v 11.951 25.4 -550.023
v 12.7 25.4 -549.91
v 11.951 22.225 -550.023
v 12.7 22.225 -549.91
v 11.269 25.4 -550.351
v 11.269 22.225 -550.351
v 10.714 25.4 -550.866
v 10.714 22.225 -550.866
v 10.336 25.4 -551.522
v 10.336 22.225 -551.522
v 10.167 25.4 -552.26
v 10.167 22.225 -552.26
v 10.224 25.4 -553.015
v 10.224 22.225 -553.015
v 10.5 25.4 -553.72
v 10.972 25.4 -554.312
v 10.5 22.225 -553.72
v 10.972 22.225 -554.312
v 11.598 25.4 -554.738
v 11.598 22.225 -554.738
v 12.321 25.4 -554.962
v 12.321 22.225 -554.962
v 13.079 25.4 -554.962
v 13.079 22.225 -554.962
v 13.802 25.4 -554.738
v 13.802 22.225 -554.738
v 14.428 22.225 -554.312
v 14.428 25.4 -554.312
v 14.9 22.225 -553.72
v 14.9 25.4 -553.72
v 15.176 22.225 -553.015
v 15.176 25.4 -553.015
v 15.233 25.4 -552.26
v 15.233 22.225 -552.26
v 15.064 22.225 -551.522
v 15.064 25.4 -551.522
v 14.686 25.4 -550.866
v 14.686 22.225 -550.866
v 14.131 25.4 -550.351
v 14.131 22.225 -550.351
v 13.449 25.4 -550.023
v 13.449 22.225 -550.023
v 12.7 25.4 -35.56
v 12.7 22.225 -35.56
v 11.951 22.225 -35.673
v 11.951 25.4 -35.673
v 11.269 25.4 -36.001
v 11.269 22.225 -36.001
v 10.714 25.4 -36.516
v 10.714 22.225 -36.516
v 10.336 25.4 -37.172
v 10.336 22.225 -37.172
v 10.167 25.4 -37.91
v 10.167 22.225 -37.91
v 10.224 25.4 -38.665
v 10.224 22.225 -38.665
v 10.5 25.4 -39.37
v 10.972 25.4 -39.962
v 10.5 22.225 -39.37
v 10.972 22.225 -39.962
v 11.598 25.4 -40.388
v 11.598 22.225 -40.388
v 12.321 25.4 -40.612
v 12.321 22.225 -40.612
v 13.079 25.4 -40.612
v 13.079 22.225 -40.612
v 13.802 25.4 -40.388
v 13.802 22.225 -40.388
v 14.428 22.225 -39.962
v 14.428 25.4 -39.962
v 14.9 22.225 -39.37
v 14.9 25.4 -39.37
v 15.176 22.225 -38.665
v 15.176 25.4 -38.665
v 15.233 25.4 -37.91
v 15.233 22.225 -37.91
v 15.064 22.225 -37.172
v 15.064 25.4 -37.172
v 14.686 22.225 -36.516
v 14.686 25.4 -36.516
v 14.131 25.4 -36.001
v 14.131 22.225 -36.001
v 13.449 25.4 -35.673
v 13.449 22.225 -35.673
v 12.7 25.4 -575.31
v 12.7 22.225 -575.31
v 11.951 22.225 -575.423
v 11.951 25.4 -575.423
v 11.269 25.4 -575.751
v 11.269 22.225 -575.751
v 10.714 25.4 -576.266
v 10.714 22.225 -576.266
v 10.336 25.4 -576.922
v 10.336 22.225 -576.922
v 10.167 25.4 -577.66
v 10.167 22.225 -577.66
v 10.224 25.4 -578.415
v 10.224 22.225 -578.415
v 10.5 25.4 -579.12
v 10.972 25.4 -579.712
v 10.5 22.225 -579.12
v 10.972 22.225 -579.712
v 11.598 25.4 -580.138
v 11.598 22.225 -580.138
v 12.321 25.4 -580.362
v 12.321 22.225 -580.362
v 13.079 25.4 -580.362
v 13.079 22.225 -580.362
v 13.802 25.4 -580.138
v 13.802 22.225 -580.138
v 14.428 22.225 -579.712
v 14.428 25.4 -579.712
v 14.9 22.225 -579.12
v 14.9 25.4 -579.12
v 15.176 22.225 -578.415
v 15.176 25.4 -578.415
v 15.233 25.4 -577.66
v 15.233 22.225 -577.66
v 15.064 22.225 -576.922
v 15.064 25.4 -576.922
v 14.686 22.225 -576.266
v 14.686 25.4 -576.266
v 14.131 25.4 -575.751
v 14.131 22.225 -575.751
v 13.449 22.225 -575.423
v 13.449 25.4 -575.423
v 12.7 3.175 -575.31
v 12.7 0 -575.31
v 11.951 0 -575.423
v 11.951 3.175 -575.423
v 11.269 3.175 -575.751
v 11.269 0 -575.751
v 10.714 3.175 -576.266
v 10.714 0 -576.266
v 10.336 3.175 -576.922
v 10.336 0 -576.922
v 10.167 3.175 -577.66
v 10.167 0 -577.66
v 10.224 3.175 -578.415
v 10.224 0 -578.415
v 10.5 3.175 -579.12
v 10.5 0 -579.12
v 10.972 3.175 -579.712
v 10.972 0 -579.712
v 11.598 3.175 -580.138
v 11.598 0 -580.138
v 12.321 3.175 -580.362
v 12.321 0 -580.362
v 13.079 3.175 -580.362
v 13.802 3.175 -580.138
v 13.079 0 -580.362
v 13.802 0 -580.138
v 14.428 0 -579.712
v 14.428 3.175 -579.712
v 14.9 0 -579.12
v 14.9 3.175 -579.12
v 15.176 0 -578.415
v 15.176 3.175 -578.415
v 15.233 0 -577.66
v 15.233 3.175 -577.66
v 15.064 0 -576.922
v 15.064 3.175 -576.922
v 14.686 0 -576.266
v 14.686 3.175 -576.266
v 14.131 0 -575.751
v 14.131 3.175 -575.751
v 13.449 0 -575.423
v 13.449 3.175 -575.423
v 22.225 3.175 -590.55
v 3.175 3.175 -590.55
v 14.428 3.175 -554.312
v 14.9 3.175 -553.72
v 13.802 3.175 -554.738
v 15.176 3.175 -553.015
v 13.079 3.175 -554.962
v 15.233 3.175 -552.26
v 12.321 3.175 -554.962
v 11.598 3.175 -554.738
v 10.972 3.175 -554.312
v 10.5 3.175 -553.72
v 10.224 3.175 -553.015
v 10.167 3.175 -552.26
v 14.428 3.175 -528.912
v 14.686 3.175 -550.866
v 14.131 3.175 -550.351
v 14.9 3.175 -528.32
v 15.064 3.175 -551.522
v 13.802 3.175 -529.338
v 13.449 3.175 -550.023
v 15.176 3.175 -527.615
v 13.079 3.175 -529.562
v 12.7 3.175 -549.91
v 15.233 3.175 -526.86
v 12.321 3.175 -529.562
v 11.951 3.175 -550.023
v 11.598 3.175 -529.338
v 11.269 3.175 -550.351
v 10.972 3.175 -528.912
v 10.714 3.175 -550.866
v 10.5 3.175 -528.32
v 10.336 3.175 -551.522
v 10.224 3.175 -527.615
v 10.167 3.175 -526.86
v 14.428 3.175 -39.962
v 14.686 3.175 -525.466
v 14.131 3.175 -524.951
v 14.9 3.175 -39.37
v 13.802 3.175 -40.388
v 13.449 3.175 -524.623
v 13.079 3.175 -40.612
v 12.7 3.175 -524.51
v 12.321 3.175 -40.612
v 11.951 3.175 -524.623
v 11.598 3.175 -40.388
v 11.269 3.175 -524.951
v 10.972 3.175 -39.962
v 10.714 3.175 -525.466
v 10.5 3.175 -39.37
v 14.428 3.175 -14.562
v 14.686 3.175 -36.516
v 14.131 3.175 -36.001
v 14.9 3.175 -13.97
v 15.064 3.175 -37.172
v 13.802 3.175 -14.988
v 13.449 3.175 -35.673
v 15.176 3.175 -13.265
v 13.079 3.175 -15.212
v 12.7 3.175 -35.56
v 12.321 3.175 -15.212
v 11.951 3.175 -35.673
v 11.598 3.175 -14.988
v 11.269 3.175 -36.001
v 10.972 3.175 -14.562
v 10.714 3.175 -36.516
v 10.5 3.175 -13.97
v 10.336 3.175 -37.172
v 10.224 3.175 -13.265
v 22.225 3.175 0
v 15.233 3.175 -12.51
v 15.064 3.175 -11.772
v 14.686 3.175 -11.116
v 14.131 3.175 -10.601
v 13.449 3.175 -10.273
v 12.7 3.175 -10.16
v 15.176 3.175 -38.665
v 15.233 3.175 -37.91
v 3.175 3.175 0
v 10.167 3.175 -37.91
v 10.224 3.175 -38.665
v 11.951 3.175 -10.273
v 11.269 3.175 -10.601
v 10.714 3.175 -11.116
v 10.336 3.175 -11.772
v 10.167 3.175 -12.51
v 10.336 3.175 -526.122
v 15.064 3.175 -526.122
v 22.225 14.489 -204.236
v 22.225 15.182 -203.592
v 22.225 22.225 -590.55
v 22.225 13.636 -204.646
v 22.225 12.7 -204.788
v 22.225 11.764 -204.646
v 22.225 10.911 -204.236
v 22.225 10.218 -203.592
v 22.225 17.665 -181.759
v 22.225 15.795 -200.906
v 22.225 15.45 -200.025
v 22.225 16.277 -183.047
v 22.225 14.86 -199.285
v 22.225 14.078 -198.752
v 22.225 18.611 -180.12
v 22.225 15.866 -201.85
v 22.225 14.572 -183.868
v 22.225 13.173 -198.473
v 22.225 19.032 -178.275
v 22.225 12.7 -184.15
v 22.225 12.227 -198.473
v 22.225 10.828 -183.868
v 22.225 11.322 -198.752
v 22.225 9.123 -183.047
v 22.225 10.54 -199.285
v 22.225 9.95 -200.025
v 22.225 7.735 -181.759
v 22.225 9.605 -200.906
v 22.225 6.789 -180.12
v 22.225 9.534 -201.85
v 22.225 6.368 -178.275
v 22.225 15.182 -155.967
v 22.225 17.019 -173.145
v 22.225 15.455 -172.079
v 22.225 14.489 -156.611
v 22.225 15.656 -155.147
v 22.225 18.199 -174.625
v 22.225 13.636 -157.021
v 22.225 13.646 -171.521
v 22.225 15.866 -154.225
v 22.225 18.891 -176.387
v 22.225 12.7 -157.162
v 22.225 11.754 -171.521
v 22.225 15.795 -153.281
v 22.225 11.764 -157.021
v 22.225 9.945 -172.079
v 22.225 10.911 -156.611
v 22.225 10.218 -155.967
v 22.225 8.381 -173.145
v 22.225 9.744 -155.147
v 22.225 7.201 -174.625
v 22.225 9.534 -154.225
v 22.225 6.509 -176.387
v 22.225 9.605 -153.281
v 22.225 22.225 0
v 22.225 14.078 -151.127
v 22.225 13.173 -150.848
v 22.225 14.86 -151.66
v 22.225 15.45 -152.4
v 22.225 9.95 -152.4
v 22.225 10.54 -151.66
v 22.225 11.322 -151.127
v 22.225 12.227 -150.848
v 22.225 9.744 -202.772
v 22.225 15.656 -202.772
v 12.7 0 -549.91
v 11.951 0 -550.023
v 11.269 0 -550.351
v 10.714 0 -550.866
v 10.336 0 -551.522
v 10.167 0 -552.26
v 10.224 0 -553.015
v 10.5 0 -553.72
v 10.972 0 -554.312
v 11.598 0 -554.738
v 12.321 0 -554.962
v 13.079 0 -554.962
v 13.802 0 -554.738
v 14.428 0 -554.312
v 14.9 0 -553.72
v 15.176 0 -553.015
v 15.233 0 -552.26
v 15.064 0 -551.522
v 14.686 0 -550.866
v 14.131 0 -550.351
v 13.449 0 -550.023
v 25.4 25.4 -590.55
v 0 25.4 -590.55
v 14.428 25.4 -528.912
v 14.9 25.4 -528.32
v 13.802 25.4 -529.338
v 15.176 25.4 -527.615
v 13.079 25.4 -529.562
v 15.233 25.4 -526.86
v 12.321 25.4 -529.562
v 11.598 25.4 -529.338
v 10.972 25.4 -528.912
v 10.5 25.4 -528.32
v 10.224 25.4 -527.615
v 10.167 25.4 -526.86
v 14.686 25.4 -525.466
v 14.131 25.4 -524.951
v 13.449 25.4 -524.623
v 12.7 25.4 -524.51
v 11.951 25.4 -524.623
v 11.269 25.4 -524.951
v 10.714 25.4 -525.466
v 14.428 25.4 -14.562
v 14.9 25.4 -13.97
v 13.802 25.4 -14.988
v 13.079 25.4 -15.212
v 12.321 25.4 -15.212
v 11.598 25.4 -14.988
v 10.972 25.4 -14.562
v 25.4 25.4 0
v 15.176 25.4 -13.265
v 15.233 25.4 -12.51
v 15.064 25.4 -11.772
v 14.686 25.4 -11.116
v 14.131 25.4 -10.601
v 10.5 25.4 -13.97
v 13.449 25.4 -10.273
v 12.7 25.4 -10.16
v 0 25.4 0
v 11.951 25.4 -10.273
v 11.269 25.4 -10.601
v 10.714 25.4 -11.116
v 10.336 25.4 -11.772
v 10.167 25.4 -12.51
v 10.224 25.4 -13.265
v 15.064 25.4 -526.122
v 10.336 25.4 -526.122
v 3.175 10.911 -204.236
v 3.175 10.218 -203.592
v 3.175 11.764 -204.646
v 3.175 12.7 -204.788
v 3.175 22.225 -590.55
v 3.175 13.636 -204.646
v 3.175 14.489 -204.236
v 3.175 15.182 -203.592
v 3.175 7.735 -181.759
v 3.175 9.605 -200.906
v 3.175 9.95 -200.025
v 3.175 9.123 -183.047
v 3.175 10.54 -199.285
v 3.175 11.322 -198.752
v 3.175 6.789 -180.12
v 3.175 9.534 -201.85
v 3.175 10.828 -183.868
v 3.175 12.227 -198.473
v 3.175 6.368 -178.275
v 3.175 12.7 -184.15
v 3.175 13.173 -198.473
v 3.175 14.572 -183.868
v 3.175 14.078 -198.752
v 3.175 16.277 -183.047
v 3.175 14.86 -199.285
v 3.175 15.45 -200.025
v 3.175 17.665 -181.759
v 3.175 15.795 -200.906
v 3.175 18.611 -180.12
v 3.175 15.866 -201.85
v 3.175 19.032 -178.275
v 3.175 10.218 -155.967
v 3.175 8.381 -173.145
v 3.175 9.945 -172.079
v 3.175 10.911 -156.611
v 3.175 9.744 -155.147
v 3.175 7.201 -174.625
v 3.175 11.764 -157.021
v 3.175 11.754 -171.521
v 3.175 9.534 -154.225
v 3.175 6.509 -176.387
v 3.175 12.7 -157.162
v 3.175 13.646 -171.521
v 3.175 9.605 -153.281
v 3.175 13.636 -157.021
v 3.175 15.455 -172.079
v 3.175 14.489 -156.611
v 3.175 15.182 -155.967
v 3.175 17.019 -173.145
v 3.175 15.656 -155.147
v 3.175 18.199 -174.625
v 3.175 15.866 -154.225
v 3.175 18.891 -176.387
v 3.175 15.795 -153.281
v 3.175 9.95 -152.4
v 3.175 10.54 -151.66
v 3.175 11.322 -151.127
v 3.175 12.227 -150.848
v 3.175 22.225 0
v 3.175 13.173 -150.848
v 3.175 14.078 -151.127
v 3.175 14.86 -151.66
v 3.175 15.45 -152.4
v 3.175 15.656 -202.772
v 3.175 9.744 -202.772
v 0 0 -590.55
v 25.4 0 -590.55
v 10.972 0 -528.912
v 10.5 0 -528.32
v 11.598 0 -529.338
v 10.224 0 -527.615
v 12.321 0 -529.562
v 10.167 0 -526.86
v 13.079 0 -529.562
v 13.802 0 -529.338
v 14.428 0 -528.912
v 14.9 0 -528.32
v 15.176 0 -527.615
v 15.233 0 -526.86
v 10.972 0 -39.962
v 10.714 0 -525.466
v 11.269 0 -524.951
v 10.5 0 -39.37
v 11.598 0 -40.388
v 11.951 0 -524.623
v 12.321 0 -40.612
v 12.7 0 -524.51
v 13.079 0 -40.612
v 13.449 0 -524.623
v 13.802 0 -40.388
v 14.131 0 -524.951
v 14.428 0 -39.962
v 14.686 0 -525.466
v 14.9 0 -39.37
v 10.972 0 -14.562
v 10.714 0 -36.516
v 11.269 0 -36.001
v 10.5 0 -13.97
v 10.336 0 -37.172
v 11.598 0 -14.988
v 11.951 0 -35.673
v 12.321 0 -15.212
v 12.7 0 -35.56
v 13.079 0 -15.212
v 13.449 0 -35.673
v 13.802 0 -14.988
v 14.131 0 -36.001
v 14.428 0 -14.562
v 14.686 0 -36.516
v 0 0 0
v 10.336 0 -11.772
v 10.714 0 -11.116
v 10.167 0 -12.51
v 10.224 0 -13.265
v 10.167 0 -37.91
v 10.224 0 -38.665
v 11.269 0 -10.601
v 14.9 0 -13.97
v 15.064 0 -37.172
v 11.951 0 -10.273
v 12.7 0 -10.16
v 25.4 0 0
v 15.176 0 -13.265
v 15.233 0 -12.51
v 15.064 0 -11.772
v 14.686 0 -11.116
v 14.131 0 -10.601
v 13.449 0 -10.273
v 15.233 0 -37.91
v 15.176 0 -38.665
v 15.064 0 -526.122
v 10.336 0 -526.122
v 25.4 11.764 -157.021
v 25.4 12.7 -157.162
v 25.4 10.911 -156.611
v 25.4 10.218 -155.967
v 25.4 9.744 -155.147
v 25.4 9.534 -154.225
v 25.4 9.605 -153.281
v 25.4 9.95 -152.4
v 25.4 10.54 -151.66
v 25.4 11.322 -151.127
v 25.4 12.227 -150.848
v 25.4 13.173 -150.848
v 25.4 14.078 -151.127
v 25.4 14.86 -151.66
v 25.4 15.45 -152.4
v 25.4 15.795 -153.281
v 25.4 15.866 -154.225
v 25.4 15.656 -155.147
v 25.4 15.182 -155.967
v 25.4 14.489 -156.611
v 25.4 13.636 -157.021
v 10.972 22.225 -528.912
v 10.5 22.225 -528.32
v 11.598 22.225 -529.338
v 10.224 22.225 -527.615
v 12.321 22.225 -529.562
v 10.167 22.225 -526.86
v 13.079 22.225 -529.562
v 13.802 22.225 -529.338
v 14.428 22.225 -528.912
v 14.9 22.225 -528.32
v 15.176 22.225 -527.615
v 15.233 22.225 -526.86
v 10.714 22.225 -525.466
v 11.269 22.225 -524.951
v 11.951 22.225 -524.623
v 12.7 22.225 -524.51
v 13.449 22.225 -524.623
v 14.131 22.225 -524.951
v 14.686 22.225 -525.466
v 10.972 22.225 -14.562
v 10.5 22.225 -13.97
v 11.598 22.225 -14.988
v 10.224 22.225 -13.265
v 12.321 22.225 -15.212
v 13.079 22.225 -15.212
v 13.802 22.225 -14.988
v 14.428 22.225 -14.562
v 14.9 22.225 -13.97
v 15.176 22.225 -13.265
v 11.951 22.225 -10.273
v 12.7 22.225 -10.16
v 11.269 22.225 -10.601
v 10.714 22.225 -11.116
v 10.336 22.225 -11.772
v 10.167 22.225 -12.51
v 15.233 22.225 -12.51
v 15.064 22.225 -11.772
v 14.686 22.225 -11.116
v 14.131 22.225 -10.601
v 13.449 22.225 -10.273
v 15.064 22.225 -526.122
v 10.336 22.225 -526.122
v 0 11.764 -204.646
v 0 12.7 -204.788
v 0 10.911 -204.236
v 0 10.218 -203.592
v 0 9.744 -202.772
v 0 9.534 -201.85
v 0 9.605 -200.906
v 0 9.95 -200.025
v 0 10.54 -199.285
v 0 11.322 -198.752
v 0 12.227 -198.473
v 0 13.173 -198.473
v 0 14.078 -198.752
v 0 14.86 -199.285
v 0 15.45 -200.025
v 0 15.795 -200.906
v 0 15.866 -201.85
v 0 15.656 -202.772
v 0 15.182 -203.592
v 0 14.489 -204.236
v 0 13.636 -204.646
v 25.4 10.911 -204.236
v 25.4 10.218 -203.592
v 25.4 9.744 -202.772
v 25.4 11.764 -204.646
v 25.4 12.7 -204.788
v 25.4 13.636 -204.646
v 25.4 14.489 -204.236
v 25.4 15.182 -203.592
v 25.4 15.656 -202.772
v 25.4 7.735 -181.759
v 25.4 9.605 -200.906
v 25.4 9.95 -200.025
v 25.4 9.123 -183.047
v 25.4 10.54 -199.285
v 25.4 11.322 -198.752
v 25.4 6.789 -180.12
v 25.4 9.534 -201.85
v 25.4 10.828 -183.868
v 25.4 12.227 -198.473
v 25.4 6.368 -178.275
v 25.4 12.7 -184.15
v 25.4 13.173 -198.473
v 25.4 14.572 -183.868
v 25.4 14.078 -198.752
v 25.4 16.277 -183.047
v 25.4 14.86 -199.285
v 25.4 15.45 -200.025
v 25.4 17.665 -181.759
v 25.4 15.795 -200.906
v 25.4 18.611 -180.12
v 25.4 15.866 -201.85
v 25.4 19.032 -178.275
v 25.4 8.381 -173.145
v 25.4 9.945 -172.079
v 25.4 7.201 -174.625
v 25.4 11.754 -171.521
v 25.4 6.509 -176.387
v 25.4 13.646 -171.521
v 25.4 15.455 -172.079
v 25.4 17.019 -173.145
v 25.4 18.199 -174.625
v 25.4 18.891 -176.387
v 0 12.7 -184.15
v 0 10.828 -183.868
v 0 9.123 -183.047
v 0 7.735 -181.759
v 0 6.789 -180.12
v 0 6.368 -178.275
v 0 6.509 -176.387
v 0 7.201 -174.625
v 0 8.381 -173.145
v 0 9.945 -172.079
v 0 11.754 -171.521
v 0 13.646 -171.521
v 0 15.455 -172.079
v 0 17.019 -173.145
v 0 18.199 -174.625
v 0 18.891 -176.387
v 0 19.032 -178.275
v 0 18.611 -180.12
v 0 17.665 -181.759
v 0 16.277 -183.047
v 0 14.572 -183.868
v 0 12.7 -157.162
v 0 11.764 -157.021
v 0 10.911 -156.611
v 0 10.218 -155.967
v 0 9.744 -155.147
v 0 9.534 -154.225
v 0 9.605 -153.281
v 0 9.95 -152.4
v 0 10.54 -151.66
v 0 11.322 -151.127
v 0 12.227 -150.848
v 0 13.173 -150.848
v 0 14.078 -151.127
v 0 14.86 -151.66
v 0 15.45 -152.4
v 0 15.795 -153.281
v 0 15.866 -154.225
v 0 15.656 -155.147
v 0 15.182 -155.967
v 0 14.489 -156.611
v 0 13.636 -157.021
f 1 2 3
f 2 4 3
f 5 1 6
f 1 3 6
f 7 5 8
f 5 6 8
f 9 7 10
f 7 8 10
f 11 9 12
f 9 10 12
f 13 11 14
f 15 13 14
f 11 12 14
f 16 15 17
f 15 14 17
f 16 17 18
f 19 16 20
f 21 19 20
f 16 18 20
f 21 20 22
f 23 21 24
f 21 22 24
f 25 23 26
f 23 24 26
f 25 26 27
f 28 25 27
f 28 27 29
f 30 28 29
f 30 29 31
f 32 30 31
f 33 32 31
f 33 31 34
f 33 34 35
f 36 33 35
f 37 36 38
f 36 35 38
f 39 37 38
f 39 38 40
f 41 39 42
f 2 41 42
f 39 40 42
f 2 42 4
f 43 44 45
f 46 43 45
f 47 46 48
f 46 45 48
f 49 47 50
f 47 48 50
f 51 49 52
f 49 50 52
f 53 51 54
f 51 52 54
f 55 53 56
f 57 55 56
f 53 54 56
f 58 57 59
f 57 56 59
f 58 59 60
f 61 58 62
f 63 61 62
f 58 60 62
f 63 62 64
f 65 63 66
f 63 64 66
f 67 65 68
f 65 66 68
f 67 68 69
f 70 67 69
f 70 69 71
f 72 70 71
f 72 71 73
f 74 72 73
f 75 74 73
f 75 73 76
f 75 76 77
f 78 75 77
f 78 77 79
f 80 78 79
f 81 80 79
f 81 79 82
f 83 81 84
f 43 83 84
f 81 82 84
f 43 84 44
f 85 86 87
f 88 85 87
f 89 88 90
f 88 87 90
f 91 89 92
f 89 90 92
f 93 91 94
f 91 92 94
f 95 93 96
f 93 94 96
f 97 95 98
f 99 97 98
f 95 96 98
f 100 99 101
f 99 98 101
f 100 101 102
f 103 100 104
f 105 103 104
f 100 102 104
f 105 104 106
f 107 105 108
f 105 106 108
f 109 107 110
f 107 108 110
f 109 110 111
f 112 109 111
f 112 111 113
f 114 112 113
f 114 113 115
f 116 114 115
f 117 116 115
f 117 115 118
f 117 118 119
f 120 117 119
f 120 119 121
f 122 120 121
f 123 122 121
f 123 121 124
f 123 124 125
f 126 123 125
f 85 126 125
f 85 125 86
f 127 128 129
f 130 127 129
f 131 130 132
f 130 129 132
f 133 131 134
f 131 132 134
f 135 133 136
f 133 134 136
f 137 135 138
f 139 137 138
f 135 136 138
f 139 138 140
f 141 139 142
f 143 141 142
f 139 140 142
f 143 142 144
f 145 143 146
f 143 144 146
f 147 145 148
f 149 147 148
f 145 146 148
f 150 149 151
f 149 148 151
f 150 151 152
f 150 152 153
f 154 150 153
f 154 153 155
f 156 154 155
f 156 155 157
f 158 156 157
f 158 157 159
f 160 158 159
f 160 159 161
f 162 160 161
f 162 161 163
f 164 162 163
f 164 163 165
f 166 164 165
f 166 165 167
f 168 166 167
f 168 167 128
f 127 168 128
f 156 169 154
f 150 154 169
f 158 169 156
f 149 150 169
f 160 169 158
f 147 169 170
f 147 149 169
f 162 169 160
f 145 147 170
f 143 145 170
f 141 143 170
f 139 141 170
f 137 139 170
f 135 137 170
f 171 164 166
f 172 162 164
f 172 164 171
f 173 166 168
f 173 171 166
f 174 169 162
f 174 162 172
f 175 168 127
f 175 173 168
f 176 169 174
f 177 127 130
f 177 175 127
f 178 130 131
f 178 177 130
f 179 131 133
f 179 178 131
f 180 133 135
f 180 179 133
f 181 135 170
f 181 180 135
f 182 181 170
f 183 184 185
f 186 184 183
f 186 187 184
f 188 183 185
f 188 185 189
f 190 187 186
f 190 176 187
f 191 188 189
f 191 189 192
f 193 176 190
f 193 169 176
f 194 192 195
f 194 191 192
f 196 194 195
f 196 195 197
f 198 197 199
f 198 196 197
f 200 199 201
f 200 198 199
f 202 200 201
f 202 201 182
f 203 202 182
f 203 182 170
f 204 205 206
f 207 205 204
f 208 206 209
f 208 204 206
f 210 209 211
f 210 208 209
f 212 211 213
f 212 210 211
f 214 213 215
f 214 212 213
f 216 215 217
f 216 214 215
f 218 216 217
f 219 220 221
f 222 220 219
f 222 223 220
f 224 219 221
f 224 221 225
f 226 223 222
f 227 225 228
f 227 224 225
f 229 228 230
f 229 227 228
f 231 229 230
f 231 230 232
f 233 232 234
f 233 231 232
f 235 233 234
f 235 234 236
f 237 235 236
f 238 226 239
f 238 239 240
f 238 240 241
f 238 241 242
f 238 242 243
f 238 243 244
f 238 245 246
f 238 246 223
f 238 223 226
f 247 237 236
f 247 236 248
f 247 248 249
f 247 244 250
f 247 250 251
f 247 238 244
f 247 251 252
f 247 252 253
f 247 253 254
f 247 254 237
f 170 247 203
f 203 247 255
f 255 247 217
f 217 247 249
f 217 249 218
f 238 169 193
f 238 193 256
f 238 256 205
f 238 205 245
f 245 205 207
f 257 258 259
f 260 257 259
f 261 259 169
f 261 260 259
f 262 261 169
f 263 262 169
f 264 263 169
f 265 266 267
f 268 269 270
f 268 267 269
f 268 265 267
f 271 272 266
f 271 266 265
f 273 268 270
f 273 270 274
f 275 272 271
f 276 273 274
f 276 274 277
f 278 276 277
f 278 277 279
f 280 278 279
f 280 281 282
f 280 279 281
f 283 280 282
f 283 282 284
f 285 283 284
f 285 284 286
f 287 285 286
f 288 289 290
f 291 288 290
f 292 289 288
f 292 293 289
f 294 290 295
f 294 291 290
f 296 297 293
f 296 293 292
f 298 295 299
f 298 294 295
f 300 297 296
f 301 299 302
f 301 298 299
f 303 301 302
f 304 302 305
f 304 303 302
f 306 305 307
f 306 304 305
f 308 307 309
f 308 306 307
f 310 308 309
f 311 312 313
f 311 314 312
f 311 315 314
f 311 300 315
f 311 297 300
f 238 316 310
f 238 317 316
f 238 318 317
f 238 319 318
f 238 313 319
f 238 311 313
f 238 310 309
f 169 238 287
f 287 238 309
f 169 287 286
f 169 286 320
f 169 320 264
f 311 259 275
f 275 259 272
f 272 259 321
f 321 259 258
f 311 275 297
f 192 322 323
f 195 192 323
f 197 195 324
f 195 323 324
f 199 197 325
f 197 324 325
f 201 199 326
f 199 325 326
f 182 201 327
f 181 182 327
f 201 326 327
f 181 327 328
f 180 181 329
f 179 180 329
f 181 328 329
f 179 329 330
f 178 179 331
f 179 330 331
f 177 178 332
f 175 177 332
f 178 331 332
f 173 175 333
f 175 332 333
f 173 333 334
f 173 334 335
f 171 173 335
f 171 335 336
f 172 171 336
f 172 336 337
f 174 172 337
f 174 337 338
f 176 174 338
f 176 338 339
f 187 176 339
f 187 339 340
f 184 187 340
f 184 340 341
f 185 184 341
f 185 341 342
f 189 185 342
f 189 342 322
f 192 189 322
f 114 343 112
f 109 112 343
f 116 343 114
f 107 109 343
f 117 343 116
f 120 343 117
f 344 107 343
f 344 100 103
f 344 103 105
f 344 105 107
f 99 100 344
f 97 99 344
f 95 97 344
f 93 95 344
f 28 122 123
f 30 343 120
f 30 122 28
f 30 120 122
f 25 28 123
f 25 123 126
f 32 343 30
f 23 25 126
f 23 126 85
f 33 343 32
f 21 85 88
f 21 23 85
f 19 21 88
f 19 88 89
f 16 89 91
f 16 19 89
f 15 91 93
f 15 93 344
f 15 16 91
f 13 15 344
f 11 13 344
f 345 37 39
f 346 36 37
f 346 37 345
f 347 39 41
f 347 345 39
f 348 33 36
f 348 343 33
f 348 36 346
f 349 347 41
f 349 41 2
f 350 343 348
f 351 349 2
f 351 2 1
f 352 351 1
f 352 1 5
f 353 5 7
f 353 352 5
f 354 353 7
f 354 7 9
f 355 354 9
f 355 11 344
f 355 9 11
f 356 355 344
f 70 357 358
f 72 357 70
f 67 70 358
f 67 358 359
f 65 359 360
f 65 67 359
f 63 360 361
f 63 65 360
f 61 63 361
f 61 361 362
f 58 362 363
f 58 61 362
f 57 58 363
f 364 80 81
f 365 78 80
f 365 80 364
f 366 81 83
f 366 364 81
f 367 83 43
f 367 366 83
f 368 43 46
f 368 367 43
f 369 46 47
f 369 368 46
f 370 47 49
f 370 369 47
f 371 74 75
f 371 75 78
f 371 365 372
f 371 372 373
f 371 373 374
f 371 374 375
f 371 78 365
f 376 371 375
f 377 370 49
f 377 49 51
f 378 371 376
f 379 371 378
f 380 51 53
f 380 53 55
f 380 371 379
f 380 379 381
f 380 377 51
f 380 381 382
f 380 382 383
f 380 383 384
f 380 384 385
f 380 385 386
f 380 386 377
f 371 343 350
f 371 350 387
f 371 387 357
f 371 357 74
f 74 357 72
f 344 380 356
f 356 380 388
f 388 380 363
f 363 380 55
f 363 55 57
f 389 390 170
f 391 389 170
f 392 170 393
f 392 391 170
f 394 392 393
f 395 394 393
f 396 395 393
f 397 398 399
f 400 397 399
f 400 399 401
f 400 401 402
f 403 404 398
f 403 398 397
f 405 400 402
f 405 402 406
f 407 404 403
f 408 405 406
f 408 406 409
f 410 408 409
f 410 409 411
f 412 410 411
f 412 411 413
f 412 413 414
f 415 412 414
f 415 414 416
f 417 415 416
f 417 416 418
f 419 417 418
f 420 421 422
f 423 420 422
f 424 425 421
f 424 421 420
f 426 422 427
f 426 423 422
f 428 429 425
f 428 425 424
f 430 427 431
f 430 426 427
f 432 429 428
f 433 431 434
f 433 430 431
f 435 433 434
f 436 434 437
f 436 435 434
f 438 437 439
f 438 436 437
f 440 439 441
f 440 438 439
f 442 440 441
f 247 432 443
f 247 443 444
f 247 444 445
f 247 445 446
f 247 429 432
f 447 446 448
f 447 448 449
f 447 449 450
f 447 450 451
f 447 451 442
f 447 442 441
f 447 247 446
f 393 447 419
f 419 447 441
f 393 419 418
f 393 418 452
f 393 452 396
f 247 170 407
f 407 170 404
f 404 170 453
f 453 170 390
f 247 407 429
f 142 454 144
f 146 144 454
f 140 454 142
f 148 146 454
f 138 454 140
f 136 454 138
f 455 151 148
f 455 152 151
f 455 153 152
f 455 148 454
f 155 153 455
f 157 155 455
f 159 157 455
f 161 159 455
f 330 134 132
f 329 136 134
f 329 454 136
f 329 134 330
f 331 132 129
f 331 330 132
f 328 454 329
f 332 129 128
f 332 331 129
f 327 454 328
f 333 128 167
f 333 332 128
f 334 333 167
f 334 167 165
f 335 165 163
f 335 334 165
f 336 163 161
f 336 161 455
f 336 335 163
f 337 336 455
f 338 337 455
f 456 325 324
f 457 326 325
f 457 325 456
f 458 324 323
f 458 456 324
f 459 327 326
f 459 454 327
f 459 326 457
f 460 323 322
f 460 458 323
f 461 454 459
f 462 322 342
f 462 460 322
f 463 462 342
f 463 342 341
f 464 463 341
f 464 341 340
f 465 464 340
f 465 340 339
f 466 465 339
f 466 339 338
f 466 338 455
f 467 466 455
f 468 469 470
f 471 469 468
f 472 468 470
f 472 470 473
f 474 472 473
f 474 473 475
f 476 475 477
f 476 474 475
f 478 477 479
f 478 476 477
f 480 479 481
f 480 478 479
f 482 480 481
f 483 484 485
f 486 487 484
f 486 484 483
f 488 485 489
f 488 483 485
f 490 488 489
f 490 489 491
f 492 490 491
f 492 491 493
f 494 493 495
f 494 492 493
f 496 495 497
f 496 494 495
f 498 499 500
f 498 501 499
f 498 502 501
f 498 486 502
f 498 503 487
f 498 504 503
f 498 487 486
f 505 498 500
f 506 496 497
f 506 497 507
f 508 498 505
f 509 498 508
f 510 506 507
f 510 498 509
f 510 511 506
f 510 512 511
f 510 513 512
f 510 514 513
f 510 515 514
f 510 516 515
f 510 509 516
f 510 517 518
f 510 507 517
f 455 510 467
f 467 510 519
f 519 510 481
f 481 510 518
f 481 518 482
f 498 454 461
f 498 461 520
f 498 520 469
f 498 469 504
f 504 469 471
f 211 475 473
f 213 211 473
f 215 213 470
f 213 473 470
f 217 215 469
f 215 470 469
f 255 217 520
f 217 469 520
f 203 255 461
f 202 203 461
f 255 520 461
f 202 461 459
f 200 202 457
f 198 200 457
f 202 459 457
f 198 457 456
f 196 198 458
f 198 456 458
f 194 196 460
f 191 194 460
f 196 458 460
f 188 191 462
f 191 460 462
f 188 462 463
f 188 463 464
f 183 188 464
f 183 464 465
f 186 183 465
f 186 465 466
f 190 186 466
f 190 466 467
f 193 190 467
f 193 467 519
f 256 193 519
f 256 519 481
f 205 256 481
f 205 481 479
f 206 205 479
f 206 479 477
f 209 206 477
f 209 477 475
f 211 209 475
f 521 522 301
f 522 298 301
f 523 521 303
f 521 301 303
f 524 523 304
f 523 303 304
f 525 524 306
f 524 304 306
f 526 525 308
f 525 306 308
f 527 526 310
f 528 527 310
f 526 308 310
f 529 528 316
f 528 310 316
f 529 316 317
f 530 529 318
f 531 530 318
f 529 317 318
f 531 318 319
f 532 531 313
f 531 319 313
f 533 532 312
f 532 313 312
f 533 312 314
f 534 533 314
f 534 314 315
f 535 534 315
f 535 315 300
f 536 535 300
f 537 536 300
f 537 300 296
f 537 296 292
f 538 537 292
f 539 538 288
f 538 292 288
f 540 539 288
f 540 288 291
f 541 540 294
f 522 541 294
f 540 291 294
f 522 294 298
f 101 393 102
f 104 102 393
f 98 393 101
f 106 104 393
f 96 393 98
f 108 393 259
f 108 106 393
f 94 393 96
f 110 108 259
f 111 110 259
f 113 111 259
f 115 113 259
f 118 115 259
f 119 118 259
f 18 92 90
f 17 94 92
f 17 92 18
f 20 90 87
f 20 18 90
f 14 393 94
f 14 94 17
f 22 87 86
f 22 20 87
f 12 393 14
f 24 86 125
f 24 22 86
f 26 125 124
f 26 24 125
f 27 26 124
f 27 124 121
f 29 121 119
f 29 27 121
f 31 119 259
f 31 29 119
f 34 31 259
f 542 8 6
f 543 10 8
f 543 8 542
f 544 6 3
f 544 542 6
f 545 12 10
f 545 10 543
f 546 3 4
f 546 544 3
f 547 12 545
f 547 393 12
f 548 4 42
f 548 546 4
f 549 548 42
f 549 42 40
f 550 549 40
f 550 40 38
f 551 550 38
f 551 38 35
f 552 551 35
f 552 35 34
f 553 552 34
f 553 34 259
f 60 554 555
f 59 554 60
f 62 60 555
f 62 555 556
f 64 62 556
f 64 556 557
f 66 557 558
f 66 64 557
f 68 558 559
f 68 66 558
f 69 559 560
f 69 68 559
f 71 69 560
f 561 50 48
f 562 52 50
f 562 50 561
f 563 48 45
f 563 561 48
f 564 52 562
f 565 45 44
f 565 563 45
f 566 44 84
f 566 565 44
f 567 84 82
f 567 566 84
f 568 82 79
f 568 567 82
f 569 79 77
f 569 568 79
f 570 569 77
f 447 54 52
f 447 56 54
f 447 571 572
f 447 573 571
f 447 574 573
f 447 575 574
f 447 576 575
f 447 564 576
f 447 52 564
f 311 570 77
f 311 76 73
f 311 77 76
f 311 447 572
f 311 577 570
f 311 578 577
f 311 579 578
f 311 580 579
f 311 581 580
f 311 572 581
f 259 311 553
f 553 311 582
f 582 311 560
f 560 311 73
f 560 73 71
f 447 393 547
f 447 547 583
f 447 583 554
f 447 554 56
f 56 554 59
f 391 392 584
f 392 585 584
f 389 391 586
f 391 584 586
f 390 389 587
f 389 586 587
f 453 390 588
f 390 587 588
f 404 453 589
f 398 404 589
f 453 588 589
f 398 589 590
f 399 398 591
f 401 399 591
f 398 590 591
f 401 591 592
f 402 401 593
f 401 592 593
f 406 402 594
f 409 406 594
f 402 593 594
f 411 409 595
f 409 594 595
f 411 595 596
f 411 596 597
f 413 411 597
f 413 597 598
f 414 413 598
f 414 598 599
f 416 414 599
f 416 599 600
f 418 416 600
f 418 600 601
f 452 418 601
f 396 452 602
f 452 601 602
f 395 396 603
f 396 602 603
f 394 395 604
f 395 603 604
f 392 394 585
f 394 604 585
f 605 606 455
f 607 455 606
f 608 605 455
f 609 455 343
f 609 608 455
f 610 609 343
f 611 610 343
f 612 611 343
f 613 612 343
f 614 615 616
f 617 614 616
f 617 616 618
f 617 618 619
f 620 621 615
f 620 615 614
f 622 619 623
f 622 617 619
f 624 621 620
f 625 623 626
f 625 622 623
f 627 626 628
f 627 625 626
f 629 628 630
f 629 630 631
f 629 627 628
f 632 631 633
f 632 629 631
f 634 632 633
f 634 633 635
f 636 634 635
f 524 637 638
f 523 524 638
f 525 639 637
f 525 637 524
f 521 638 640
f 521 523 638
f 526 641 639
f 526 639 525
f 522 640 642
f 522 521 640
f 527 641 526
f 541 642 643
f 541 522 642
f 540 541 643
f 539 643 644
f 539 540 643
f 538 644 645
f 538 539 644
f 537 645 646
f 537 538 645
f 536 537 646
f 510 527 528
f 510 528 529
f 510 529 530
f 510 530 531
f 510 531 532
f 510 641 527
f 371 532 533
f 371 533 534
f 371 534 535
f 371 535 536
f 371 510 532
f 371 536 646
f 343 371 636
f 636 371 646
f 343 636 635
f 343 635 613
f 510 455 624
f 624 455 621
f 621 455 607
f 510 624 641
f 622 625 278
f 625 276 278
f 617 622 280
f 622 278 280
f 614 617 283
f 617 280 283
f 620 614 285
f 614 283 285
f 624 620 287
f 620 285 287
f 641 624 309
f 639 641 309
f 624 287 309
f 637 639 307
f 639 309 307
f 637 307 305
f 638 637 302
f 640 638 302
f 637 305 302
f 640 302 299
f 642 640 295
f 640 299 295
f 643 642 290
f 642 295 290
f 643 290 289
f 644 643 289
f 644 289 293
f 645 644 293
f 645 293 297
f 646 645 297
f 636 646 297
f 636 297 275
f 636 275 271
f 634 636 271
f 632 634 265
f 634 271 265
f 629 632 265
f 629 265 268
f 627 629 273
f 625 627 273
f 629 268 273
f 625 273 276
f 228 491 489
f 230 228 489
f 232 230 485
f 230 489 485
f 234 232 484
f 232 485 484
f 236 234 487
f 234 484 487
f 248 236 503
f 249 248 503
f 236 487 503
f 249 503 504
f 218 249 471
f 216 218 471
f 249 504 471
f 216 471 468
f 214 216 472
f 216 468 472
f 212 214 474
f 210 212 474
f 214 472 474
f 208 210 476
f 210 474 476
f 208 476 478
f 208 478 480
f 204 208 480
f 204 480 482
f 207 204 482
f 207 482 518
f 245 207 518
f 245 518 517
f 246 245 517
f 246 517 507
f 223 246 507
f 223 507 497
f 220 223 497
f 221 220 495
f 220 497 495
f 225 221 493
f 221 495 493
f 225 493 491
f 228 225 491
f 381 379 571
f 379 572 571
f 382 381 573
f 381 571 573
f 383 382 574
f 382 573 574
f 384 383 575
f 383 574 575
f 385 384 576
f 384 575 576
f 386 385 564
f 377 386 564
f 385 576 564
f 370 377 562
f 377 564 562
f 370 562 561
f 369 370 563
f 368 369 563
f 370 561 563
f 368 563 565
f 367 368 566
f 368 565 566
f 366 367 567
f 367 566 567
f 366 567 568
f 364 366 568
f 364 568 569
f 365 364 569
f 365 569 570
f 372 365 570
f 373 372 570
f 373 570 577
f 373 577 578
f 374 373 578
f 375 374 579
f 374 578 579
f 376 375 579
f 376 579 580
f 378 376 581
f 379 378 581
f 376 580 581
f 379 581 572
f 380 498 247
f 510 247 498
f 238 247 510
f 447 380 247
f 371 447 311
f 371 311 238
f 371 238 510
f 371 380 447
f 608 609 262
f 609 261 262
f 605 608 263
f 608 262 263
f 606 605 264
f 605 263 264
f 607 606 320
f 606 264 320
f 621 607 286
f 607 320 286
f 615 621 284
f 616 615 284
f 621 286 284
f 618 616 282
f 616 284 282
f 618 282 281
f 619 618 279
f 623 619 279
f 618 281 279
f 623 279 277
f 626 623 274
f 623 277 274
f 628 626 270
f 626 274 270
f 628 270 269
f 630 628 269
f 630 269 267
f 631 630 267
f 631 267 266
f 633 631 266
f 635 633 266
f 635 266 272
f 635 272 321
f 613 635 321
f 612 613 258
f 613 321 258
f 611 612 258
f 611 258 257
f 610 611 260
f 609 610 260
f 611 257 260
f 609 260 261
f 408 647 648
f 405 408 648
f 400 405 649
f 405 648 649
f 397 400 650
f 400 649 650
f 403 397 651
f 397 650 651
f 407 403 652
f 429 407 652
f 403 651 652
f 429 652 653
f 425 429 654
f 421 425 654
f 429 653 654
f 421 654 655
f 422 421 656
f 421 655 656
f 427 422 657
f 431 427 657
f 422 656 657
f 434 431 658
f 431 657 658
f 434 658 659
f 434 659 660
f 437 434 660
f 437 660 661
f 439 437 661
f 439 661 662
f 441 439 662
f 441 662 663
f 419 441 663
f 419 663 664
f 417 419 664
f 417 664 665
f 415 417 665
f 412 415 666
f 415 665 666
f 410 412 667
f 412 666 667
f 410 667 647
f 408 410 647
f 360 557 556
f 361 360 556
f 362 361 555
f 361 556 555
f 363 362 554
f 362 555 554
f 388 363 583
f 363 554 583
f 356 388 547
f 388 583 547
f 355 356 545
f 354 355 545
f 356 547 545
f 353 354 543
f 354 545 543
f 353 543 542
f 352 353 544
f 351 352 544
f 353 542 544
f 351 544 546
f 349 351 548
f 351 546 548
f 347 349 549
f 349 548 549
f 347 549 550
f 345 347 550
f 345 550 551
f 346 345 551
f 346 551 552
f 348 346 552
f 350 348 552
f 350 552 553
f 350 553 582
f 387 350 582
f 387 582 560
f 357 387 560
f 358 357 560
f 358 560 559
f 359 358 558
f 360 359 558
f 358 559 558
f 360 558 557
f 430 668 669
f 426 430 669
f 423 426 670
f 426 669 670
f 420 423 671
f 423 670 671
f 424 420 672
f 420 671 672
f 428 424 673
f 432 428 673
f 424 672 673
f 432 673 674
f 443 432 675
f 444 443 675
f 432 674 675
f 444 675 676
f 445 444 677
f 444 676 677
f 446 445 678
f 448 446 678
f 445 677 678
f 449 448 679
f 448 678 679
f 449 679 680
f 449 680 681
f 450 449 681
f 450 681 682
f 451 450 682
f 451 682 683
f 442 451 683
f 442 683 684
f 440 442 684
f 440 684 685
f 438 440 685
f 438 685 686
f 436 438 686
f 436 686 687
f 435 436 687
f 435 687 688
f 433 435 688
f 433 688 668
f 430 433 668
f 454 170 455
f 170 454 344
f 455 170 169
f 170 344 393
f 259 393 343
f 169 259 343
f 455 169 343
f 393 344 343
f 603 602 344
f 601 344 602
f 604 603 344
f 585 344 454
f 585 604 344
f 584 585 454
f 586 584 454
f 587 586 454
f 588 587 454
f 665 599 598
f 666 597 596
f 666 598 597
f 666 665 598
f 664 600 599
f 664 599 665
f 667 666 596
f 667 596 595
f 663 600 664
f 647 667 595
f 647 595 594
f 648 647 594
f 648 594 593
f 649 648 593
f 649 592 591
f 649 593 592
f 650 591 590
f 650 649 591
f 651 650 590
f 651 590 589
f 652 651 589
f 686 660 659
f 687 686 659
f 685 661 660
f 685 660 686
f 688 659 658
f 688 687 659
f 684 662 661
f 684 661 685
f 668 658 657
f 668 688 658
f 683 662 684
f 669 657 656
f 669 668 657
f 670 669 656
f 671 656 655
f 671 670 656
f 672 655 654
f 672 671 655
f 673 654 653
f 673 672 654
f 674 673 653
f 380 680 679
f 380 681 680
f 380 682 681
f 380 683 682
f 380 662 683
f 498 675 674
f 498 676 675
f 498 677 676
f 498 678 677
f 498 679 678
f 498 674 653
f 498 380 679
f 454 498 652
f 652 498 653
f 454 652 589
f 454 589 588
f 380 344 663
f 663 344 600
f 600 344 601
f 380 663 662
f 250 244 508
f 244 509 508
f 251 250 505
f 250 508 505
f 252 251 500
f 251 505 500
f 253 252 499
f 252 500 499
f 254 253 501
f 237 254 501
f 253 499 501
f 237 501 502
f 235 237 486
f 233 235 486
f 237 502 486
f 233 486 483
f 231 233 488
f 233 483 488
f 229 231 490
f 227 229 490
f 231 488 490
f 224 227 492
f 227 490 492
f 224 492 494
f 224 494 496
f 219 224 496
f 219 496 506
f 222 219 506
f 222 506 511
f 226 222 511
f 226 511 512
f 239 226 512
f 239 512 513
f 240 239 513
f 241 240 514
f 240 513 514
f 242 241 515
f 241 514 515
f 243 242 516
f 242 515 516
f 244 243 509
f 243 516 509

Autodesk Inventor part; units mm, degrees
ref_plane "YZ Plane" through (0, 0, 0) normal (1, 0, 0) x (0, 1, 0)
ref_plane "XZ Plane" through (0, 0, 0) normal (0, 1, 0) x (-1, 0, 0)
ref_plane "XY Plane" through (0, 0, 0) normal (0, 0, 1) x (1, 0, 0)
sketch "Sketch1" plane through (0, 0, 0) normal (0, 0, 1) x (1, 0, 0)
  line L0 (0, 0) -> (25.4, 0)
  line L1 (25.4, 0) -> (25.4, 25.4)
  line L2 (25.4, 25.4) -> (0, 25.4)
  line L3 (0, 25.4) -> (0, 0)
  line L4 (3.175, 22.225) -> (22.225, 22.225)
  line L5 (22.225, 22.225) -> (22.225, 3.175)
  line L6 (22.225, 3.175) -> (3.175, 3.175)
  line L7 (3.175, 3.175) -> (3.175, 22.225)
  dimension "d0" = 25.4
  dimension "d1" = 25.4
  dimension "d2" = 3.175
extrude "Extrusion1" add sketch "Sketch1" against normal blind 590.55
sketch "Sketch4" plane through (0, 25.4, 0) normal (0, 1, 0) x (1, 0, 0)
  line L0 (25.4, 590.55) -> (0, 590.55) projected
  line L1 (25.4, 0) -> (0, 0) projected
  point P0 (12.7, 12.7)
  point P1 (12.7, 38.1)
  point P2 (12.7, 577.85)
  point P3 (12.7, 552.45)
  point P4 (12.7, 527.05)
  dimension "d32" = 12.7
  dimension "d33" = 25.4
  dimension "d34" = 12.7
  dimension "d35" = 25.4
  dimension "d36" = 25.4
hole "Hole4" at (12.7, 25.4, -12.7) at (12.7, 25.4, -38.1) at (12.7, 25.4, -577.85) at (12.7, 25.4, -552.45) at (12.7, 25.4, -527.05) direction (0, -1, 0) diameter 5.08 depth 25.4 tip angle 118
sketch "Sketch5" plane through (25.4, 0, 0) normal (1, 0, 0) x (0, 0, -1)
  line L0 (0, 0) -> (0, 25.4) projected
  point P0 (177.8, 12.7)
  point P1 (153.9875, 12.7)
  point P2 (201.6125, 12.7)
  point P3 (0, 12.7)
  dimension "d44" = 23.8125
  dimension "d45" = 23.8125
  dimension "d46" = 177.8
hole "Hole5" at (25.4, 12.7, -153.9875) at (25.4, 12.7, -201.6125) direction (-1, 0, 0) diameter 6.35 depth 25.4 tip angle 118
hole "Hole6" at (25.4, 12.7, -177.8) direction (-1, 0, 0) diameter 12.7 depth 25.4 tip angle 118
properties part number "new vertical kicker thing"
